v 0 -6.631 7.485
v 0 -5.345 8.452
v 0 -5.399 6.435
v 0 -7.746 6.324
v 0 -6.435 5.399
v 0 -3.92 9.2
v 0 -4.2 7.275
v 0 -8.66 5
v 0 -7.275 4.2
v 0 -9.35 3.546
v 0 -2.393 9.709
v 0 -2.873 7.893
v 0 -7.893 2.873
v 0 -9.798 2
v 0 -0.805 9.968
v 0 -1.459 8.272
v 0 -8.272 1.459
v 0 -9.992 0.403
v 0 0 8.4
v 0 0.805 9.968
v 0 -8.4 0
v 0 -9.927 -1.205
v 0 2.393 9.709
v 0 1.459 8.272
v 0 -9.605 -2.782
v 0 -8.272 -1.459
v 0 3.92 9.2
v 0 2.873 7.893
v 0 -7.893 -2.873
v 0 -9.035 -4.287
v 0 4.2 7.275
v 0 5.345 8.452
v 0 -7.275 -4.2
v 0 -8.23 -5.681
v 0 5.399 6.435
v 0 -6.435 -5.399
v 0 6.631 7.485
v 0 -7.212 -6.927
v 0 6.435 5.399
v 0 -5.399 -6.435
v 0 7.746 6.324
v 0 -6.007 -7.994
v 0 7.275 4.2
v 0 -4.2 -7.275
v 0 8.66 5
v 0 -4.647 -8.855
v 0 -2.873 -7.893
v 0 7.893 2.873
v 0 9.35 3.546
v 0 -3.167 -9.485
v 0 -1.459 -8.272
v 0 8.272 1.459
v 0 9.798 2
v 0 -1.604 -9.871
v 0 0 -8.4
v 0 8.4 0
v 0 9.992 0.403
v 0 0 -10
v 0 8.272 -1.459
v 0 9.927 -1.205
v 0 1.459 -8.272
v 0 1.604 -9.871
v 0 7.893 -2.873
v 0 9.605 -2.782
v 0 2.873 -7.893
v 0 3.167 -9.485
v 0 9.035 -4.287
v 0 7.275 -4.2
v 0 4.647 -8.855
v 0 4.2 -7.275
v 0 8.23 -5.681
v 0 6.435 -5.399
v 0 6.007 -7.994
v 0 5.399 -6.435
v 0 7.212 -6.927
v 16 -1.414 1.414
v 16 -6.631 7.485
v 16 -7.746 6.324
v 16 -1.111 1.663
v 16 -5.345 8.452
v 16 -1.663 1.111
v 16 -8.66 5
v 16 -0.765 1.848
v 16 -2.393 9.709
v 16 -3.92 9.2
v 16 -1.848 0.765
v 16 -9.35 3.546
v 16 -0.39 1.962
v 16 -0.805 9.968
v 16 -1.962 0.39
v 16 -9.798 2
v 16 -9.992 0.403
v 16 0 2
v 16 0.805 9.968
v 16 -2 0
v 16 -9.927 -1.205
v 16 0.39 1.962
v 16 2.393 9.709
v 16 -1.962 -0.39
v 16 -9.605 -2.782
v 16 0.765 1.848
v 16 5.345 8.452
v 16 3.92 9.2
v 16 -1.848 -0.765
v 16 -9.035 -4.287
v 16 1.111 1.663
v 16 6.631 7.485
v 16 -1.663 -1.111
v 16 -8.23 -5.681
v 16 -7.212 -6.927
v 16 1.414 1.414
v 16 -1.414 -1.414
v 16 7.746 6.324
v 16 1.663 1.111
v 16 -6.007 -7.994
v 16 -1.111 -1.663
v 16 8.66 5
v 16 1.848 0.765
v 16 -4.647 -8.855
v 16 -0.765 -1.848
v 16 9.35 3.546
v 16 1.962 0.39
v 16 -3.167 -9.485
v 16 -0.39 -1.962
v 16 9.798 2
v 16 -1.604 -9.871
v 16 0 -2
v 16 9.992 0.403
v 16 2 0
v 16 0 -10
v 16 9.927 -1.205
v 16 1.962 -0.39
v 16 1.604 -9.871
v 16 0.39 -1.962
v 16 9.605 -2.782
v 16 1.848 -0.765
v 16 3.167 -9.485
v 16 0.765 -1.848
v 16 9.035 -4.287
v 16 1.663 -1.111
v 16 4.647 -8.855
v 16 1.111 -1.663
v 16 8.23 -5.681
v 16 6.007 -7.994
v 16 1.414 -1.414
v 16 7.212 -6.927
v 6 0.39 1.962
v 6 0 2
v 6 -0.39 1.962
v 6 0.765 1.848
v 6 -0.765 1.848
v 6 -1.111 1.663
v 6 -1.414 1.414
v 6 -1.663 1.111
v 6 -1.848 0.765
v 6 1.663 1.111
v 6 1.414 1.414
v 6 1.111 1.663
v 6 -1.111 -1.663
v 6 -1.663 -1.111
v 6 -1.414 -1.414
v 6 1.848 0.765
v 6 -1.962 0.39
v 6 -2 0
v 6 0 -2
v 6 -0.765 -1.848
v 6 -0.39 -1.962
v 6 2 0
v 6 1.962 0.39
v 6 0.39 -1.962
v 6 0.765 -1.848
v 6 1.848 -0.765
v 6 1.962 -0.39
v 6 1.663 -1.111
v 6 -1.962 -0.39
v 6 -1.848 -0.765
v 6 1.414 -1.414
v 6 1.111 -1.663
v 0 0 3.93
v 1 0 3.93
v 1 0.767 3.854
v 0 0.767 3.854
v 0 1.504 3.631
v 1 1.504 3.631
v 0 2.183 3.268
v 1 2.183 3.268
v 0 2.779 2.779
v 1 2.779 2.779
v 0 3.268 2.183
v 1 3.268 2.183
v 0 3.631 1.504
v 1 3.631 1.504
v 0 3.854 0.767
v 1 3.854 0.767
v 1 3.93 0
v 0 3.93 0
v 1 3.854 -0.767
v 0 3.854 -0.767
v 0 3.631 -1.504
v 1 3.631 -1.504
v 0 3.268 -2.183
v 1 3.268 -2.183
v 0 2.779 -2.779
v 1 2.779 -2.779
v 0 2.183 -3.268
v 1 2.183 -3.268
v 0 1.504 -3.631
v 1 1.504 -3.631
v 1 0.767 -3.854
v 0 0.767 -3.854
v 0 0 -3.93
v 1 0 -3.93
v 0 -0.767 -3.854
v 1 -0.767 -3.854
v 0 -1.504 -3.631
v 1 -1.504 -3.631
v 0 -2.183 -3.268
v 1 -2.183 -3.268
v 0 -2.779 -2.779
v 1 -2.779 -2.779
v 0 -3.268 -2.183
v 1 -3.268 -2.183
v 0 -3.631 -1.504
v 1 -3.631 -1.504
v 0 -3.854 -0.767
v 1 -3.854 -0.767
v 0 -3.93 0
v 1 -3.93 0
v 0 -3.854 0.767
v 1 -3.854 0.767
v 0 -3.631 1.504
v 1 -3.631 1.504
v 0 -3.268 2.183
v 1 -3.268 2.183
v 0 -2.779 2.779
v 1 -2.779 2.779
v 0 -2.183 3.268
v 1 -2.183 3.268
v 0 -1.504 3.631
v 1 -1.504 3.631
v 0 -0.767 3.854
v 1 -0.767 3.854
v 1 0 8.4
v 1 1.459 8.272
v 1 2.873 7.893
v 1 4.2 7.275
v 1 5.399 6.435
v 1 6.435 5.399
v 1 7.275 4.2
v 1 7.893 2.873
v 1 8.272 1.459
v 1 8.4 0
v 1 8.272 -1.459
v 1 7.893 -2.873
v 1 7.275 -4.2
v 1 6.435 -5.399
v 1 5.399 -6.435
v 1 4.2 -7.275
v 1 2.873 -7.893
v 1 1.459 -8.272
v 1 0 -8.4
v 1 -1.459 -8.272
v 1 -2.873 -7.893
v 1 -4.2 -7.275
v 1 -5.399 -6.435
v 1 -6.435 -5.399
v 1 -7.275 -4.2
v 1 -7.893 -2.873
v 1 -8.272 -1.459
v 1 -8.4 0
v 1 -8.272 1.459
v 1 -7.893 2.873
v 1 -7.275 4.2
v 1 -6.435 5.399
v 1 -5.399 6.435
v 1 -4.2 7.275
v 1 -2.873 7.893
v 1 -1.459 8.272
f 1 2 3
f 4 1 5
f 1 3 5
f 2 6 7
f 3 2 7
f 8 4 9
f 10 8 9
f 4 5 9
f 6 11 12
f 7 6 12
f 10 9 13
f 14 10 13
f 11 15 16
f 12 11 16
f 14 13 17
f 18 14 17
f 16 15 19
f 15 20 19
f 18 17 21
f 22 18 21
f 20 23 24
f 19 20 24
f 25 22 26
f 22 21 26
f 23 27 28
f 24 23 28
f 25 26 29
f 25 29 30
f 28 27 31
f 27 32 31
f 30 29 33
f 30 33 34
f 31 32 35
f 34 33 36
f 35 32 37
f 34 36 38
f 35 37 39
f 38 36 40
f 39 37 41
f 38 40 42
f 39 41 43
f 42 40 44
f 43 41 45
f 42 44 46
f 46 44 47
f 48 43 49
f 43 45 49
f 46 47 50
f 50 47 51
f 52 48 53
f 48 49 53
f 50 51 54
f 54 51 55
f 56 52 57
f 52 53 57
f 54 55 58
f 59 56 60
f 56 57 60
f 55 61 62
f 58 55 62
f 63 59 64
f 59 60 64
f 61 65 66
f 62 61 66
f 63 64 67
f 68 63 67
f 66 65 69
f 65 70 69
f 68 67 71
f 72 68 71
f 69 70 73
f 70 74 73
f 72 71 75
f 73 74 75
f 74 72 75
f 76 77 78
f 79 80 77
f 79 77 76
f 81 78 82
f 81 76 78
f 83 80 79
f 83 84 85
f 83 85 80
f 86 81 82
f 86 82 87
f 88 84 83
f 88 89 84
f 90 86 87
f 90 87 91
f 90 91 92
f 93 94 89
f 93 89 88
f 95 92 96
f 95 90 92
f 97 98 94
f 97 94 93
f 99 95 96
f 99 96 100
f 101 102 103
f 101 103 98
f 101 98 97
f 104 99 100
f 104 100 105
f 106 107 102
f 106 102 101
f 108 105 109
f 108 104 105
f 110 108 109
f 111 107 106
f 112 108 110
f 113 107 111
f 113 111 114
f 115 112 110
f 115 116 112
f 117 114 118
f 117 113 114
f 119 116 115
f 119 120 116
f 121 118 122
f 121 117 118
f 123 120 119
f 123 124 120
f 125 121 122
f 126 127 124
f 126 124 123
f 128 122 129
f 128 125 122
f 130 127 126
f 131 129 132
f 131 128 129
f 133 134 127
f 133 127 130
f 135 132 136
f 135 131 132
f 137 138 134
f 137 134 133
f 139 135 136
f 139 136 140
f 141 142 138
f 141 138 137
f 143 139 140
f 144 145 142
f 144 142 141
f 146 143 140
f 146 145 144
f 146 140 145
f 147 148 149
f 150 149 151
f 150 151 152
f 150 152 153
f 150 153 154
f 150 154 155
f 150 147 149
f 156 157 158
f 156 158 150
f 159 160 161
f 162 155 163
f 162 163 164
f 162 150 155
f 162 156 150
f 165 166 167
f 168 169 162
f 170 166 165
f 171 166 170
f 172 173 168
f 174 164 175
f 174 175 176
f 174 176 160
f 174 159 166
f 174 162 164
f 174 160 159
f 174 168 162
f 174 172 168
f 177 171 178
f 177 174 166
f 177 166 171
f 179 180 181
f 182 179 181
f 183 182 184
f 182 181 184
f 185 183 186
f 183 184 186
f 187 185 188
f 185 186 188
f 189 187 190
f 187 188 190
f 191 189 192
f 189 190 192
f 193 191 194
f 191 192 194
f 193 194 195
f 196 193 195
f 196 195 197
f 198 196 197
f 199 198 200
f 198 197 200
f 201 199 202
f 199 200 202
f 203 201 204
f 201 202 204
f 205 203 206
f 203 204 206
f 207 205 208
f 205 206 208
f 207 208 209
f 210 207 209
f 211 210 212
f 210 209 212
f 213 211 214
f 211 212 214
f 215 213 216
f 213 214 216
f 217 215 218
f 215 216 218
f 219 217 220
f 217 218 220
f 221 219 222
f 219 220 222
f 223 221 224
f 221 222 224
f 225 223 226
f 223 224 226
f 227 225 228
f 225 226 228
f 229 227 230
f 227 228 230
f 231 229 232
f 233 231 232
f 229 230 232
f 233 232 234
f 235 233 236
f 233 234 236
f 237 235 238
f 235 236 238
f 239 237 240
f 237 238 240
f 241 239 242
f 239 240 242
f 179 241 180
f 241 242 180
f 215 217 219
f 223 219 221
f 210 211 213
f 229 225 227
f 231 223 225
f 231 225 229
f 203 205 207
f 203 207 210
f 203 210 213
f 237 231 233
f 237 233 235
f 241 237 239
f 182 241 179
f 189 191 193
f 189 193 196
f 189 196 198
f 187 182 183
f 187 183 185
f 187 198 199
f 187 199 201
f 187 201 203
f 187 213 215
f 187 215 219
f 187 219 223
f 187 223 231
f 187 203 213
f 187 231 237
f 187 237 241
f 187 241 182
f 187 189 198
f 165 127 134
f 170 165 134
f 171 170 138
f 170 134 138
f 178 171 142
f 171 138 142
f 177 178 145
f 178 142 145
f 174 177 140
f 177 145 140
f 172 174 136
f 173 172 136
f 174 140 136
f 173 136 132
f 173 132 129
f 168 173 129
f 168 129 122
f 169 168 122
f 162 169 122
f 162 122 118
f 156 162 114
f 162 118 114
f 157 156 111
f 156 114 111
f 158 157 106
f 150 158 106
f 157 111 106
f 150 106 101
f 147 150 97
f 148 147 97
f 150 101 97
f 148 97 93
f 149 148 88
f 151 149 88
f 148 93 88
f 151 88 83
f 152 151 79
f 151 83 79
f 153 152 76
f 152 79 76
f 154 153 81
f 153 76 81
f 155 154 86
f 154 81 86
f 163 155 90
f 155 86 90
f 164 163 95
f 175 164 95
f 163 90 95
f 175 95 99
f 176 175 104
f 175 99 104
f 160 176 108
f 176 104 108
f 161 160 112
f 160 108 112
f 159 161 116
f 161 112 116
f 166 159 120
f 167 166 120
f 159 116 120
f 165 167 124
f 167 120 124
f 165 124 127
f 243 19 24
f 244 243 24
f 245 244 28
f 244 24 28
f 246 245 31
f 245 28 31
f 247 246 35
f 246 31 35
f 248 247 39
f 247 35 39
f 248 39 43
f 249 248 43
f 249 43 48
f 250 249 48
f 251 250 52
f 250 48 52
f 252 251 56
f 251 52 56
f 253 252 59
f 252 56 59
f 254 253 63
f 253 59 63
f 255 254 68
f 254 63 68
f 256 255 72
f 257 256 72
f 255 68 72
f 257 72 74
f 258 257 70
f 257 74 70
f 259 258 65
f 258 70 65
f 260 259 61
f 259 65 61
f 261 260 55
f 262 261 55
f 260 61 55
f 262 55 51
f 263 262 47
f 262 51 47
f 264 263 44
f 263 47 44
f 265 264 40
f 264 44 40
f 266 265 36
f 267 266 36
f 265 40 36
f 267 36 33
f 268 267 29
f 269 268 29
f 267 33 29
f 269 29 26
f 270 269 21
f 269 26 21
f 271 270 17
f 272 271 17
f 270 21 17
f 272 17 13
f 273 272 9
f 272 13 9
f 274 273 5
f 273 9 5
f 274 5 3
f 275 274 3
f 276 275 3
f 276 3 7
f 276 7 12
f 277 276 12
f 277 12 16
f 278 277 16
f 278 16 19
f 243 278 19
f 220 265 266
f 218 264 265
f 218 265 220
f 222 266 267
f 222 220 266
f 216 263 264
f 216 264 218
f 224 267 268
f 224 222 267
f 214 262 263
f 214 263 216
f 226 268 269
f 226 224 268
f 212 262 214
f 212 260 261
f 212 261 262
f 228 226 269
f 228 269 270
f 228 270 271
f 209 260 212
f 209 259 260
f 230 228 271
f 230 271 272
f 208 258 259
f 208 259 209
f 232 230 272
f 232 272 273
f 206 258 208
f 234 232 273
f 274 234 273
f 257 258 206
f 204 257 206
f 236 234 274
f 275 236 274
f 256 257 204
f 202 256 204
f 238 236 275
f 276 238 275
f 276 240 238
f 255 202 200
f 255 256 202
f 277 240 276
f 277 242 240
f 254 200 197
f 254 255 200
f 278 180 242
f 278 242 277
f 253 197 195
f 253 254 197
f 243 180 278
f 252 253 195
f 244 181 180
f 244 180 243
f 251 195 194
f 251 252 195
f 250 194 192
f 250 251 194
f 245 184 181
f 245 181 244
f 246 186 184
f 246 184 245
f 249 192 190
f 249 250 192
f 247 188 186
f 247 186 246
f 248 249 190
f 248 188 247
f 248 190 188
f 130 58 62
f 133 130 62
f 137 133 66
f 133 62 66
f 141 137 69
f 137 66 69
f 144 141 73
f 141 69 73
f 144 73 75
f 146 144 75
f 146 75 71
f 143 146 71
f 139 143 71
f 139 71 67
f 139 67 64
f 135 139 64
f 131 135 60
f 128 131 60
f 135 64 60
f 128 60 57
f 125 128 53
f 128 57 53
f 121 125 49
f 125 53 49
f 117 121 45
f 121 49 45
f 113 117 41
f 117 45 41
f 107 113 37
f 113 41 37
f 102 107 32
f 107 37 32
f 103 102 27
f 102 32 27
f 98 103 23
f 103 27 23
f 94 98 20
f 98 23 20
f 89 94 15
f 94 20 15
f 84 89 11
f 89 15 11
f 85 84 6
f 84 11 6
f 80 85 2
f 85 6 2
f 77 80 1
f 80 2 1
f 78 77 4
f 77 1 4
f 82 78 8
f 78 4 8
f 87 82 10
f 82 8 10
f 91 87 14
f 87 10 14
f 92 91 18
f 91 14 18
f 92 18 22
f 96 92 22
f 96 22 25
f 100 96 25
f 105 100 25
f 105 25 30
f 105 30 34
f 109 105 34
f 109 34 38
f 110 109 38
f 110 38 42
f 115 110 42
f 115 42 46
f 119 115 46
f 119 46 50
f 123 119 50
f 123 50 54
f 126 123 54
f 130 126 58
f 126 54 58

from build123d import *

# Parameters (mm, degrees)
SKETCH_1_R          = 10
EXTRUDE_1_DEPTH     = 16
SKETCH_2_R          = 2
CUT_EXTRUDE_1_DEPTH = 10
SKETCH_4_R          = 8.4
CUT_EXTRUDE_2_DEPTH = 1
SKETCH_5_R          = 3.93
EXTRUDE_2_DEPTH     = 1


with BuildPart() as part:
    # 草图1 → 凸台-拉伸1 (new body)
    with BuildSketch(Plane(origin=(0, 0, 0), x_dir=(0, 0, -1), z_dir=(1, 0, 0))):
        Circle(SKETCH_1_R)
    extrude(amount=EXTRUDE_1_DEPTH)

    # 草图2 → 切除-拉伸1 (cut)
    with BuildSketch(Plane(origin=(16, 0, 0), x_dir=(0, 0, -1), z_dir=(1, 0, 0))):
        Circle(SKETCH_2_R)
    extrude(amount=-CUT_EXTRUDE_1_DEPTH, mode=Mode.SUBTRACT)

    # 草图4 → 切除-拉伸2 (cut)
    with BuildSketch(Plane.ZY):
        Circle(SKETCH_4_R)
    extrude(amount=-CUT_EXTRUDE_2_DEPTH, mode=Mode.SUBTRACT)

    # 草图5 → 凸台-拉伸2 (add)
    with BuildSketch(Plane.ZY.offset(-1)):
        Circle(SKETCH_5_R)
    extrude(amount=EXTRUDE_2_DEPTH)


solid = part.part
